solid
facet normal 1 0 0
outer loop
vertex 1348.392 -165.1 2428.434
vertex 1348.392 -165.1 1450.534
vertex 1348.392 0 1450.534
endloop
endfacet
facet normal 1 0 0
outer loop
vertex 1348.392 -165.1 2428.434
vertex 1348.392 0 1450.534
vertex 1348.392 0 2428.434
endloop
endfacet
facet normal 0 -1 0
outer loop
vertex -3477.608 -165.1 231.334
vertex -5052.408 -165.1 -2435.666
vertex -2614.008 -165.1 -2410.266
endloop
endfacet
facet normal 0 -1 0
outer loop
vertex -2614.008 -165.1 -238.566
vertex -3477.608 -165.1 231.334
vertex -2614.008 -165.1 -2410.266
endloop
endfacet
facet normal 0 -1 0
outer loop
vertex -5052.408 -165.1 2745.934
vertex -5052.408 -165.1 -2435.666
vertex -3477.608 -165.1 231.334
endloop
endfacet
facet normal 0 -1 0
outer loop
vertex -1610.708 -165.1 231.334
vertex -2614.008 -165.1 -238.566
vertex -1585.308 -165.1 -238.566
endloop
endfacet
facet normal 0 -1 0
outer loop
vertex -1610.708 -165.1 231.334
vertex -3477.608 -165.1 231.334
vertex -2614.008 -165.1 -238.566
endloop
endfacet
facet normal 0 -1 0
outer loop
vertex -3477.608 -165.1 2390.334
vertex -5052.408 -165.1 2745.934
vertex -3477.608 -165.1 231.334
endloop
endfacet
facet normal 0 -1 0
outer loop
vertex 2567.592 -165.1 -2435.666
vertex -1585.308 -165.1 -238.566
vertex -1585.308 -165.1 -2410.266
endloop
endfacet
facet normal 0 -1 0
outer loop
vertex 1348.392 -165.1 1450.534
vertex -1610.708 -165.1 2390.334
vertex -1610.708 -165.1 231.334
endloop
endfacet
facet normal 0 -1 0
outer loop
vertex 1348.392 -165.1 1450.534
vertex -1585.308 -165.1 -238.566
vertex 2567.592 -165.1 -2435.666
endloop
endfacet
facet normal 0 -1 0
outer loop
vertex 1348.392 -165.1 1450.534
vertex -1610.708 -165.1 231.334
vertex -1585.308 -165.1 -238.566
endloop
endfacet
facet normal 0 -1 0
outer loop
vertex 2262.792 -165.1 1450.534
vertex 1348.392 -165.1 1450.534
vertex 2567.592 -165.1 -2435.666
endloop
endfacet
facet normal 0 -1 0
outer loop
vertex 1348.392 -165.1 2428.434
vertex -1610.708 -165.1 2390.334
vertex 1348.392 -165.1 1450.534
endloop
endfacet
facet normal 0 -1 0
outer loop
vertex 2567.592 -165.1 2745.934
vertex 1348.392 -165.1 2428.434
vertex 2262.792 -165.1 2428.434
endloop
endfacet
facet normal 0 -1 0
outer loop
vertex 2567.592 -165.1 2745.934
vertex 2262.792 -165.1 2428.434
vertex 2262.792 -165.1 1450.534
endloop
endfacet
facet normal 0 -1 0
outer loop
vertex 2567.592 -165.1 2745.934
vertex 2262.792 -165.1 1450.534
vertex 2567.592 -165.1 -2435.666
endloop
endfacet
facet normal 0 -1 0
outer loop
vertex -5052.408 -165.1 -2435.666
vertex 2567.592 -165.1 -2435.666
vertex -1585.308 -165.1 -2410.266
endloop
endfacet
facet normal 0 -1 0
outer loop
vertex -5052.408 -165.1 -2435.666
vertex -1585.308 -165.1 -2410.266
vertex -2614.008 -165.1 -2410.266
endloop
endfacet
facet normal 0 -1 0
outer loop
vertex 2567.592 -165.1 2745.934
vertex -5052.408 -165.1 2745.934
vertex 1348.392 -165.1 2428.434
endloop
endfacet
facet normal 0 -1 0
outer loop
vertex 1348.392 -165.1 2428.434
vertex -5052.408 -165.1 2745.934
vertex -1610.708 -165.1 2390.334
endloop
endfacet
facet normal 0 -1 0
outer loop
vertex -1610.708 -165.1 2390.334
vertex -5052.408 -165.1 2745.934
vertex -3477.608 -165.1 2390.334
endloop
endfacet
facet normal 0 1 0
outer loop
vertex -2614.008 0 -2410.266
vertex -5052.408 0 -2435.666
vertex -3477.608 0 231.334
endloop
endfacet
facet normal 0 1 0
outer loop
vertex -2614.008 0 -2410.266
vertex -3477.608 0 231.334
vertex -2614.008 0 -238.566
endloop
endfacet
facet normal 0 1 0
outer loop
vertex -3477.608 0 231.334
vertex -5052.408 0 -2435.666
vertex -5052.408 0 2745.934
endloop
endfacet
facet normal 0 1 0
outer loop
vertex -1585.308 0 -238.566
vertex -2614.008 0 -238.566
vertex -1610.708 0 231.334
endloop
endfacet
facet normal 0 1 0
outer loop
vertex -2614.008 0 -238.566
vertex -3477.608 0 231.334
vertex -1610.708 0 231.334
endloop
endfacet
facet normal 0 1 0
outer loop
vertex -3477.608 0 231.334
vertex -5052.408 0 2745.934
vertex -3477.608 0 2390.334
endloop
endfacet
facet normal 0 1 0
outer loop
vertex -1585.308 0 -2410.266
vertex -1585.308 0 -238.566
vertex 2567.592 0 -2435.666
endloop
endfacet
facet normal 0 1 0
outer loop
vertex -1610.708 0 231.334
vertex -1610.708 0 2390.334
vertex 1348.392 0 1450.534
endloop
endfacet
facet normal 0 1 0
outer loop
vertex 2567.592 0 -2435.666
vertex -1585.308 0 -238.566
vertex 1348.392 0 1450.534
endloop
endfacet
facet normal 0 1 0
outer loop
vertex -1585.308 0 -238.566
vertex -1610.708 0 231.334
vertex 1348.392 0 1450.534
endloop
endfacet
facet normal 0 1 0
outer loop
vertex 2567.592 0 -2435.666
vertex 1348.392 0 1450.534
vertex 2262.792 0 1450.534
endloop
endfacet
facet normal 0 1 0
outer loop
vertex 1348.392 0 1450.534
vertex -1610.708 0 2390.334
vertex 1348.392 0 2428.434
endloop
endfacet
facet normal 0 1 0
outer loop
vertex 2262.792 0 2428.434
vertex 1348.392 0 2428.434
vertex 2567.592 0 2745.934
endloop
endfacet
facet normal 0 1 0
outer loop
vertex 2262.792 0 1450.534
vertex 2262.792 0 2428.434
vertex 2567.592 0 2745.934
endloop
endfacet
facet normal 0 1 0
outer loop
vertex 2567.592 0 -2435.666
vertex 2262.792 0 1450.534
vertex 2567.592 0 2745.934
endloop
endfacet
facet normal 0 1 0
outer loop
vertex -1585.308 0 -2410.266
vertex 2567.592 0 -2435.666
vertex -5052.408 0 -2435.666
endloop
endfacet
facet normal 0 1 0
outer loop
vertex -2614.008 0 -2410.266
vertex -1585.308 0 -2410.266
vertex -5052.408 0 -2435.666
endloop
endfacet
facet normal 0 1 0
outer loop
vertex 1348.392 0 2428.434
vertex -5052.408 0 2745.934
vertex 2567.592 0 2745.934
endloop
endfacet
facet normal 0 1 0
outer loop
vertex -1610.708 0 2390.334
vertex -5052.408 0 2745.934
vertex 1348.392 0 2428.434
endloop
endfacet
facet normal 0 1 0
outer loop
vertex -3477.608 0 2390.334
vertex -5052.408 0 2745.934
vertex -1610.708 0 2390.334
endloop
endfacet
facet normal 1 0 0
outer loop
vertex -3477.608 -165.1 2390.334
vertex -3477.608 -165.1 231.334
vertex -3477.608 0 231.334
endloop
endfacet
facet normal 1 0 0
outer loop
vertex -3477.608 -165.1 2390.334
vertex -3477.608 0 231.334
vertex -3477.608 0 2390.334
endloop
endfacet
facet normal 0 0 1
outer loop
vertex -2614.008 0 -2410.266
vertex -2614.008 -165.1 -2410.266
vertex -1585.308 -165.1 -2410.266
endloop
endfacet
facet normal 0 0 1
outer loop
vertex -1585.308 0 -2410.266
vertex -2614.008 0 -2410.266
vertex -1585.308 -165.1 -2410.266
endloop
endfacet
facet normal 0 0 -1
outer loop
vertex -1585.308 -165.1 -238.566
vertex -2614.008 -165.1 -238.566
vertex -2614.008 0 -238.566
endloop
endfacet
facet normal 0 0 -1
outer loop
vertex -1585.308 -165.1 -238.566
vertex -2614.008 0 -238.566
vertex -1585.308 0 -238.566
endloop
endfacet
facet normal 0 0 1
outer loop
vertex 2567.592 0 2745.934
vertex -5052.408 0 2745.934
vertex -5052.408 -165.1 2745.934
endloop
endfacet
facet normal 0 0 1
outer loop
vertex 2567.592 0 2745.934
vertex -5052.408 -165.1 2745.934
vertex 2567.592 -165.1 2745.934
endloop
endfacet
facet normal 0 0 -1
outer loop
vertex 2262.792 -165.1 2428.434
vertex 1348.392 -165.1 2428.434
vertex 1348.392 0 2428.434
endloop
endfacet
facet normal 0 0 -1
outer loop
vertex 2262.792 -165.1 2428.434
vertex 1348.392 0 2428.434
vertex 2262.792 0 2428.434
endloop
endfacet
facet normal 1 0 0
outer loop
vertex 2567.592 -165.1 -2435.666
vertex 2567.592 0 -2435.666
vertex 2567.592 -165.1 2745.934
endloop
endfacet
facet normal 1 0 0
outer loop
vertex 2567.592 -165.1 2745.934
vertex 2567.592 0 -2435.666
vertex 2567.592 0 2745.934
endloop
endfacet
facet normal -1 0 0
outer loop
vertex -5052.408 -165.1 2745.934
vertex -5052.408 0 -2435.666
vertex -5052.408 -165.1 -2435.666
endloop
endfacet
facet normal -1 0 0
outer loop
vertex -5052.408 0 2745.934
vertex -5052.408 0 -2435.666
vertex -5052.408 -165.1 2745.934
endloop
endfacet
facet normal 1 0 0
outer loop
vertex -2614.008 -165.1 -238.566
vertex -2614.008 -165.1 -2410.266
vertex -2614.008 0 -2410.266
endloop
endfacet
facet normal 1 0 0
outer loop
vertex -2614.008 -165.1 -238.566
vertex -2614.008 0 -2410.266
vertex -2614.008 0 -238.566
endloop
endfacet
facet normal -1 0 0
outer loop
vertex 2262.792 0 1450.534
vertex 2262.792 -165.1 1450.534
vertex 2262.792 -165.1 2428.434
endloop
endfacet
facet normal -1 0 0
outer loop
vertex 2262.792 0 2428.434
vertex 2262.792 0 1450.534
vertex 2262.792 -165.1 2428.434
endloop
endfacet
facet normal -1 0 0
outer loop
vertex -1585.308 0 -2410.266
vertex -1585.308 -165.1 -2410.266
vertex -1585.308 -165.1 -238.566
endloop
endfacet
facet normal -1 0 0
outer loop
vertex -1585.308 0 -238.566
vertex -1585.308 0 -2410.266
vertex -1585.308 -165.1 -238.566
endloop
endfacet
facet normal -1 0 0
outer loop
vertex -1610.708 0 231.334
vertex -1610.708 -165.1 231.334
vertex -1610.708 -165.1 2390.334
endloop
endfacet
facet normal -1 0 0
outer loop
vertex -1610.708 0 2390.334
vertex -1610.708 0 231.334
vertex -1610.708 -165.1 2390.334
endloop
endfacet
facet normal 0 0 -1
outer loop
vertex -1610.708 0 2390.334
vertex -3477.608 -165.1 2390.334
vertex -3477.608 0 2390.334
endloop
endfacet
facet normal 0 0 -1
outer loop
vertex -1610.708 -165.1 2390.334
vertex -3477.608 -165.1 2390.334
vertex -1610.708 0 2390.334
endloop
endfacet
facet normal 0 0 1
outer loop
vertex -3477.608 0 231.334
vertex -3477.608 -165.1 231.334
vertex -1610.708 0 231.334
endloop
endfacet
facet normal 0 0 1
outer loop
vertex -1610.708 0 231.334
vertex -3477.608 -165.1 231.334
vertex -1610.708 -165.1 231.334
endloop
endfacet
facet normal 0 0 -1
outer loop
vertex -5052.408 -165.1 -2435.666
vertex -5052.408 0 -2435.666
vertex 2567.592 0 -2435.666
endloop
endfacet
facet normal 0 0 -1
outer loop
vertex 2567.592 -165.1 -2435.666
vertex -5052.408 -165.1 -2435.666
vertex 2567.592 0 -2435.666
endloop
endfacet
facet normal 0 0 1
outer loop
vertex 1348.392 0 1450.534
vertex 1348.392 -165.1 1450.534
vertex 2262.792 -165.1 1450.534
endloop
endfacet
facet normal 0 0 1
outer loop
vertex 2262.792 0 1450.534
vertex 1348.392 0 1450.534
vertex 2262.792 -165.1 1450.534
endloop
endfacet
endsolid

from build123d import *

# Parameters (mm, degrees)
F0_W     = 7620
F0_H     = 5181.6
F1_DEPTH = 165.1
F2_W     = 1866.9
F2_H     = 2159
F3_DEPTH = 165.101
F4_W     = 914.4
F4_H     = 977.9
F5_DEPTH = 165.101
F6_W     = 1028.7
F6_H     = 2171.7
F7_DEPTH = 165.101


with BuildPart() as f1:
    # F0 (on Front) → F1 (new body)
    with BuildSketch(Plane.XZ):
        with Locations((-1242.408483, 155.134192)):
            Rectangle(F0_W, F0_H)
    extrude(amount=F1_DEPTH)

    # F2 (on face) → F3 (cut, through all)
    with BuildSketch(Plane.XZ.offset(165.1)):
        with Locations((-2544.158483, 1310.834192)):
            Rectangle(F2_W, F2_H)
    extrude(amount=-F3_DEPTH, mode=Mode.SUBTRACT)

    # F4 (on face) → F5 (cut, through all)
    with BuildSketch(Plane.XZ.offset(165.1)):
        with Locations((1805.591517, 1939.484192)):
            Rectangle(F4_W, F4_H)
    extrude(amount=-F5_DEPTH, mode=Mode.SUBTRACT)

    # F6 (on face) → F7 (cut, through all)
    with BuildSketch(Plane.XZ.offset(165.1)):
        with Locations((-2099.658483, -1324.415808)):
            Rectangle(F6_W, F6_H)
    extrude(amount=-F7_DEPTH, mode=Mode.SUBTRACT)


solid = f1.part
